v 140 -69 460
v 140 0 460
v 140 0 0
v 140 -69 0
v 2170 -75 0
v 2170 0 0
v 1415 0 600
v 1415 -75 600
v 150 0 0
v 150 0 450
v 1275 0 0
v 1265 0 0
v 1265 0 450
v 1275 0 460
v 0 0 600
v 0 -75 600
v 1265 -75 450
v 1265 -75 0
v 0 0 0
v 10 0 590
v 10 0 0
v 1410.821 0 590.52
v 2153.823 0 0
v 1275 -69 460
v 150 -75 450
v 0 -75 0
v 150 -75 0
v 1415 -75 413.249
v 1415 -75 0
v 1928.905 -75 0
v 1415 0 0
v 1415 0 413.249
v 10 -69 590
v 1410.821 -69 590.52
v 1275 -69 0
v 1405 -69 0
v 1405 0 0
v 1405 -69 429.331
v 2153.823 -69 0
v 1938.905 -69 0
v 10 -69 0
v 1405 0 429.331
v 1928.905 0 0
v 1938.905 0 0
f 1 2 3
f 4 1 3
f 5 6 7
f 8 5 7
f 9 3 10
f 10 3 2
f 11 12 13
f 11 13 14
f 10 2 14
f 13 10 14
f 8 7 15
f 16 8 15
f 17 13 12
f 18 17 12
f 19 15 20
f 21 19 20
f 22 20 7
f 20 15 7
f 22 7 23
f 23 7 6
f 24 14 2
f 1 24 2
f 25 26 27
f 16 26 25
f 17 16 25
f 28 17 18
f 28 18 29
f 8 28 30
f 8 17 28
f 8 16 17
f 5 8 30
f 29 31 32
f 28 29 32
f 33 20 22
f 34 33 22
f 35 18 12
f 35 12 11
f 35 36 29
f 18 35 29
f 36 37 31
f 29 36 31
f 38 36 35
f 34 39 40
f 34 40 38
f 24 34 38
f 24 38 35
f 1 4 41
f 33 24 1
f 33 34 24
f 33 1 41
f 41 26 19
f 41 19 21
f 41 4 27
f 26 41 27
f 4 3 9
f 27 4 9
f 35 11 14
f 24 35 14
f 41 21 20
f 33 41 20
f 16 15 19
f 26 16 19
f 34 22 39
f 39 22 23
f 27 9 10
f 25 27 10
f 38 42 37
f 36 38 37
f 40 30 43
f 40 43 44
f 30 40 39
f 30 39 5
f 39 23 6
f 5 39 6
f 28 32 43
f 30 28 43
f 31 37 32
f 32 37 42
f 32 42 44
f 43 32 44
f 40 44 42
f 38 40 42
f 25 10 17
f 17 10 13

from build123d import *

# Parameters (mm, degrees)
F1_DEPTH = 75
F3_DEPTH = 69


with BuildPart() as f1:
    # F0 (on Front) → F1 (new body)
    with BuildSketch(Plane.XZ):
        Polygon((0, 600), (0, 0), (150, 0), (150, 450), (1265, 450), (1265, 0), (1415, 0), (1415, 413.248549), (1928.905491, 0), (2170, 0), (1415, 600), align=None)
    extrude(amount=F1_DEPTH)

    # F2 (on face) → F3 (cut)
    with BuildSketch(Plane(origin=(0, 0, 0), x_dir=(-1, 0, 0), z_dir=(0, 1, 0))):
        Polygon((-1405, 0), (-1275, 0), (-1275, 460), (-140, 460), (-140, 0), (-10, 0), (-10, 590), (-1410.821319, 590.520203), (-2153.822899, 0), (-1938.905491, 0), (-1405, 429.331216), align=None)
    extrude(amount=-F3_DEPTH, mode=Mode.SUBTRACT)


solid = f1.part
